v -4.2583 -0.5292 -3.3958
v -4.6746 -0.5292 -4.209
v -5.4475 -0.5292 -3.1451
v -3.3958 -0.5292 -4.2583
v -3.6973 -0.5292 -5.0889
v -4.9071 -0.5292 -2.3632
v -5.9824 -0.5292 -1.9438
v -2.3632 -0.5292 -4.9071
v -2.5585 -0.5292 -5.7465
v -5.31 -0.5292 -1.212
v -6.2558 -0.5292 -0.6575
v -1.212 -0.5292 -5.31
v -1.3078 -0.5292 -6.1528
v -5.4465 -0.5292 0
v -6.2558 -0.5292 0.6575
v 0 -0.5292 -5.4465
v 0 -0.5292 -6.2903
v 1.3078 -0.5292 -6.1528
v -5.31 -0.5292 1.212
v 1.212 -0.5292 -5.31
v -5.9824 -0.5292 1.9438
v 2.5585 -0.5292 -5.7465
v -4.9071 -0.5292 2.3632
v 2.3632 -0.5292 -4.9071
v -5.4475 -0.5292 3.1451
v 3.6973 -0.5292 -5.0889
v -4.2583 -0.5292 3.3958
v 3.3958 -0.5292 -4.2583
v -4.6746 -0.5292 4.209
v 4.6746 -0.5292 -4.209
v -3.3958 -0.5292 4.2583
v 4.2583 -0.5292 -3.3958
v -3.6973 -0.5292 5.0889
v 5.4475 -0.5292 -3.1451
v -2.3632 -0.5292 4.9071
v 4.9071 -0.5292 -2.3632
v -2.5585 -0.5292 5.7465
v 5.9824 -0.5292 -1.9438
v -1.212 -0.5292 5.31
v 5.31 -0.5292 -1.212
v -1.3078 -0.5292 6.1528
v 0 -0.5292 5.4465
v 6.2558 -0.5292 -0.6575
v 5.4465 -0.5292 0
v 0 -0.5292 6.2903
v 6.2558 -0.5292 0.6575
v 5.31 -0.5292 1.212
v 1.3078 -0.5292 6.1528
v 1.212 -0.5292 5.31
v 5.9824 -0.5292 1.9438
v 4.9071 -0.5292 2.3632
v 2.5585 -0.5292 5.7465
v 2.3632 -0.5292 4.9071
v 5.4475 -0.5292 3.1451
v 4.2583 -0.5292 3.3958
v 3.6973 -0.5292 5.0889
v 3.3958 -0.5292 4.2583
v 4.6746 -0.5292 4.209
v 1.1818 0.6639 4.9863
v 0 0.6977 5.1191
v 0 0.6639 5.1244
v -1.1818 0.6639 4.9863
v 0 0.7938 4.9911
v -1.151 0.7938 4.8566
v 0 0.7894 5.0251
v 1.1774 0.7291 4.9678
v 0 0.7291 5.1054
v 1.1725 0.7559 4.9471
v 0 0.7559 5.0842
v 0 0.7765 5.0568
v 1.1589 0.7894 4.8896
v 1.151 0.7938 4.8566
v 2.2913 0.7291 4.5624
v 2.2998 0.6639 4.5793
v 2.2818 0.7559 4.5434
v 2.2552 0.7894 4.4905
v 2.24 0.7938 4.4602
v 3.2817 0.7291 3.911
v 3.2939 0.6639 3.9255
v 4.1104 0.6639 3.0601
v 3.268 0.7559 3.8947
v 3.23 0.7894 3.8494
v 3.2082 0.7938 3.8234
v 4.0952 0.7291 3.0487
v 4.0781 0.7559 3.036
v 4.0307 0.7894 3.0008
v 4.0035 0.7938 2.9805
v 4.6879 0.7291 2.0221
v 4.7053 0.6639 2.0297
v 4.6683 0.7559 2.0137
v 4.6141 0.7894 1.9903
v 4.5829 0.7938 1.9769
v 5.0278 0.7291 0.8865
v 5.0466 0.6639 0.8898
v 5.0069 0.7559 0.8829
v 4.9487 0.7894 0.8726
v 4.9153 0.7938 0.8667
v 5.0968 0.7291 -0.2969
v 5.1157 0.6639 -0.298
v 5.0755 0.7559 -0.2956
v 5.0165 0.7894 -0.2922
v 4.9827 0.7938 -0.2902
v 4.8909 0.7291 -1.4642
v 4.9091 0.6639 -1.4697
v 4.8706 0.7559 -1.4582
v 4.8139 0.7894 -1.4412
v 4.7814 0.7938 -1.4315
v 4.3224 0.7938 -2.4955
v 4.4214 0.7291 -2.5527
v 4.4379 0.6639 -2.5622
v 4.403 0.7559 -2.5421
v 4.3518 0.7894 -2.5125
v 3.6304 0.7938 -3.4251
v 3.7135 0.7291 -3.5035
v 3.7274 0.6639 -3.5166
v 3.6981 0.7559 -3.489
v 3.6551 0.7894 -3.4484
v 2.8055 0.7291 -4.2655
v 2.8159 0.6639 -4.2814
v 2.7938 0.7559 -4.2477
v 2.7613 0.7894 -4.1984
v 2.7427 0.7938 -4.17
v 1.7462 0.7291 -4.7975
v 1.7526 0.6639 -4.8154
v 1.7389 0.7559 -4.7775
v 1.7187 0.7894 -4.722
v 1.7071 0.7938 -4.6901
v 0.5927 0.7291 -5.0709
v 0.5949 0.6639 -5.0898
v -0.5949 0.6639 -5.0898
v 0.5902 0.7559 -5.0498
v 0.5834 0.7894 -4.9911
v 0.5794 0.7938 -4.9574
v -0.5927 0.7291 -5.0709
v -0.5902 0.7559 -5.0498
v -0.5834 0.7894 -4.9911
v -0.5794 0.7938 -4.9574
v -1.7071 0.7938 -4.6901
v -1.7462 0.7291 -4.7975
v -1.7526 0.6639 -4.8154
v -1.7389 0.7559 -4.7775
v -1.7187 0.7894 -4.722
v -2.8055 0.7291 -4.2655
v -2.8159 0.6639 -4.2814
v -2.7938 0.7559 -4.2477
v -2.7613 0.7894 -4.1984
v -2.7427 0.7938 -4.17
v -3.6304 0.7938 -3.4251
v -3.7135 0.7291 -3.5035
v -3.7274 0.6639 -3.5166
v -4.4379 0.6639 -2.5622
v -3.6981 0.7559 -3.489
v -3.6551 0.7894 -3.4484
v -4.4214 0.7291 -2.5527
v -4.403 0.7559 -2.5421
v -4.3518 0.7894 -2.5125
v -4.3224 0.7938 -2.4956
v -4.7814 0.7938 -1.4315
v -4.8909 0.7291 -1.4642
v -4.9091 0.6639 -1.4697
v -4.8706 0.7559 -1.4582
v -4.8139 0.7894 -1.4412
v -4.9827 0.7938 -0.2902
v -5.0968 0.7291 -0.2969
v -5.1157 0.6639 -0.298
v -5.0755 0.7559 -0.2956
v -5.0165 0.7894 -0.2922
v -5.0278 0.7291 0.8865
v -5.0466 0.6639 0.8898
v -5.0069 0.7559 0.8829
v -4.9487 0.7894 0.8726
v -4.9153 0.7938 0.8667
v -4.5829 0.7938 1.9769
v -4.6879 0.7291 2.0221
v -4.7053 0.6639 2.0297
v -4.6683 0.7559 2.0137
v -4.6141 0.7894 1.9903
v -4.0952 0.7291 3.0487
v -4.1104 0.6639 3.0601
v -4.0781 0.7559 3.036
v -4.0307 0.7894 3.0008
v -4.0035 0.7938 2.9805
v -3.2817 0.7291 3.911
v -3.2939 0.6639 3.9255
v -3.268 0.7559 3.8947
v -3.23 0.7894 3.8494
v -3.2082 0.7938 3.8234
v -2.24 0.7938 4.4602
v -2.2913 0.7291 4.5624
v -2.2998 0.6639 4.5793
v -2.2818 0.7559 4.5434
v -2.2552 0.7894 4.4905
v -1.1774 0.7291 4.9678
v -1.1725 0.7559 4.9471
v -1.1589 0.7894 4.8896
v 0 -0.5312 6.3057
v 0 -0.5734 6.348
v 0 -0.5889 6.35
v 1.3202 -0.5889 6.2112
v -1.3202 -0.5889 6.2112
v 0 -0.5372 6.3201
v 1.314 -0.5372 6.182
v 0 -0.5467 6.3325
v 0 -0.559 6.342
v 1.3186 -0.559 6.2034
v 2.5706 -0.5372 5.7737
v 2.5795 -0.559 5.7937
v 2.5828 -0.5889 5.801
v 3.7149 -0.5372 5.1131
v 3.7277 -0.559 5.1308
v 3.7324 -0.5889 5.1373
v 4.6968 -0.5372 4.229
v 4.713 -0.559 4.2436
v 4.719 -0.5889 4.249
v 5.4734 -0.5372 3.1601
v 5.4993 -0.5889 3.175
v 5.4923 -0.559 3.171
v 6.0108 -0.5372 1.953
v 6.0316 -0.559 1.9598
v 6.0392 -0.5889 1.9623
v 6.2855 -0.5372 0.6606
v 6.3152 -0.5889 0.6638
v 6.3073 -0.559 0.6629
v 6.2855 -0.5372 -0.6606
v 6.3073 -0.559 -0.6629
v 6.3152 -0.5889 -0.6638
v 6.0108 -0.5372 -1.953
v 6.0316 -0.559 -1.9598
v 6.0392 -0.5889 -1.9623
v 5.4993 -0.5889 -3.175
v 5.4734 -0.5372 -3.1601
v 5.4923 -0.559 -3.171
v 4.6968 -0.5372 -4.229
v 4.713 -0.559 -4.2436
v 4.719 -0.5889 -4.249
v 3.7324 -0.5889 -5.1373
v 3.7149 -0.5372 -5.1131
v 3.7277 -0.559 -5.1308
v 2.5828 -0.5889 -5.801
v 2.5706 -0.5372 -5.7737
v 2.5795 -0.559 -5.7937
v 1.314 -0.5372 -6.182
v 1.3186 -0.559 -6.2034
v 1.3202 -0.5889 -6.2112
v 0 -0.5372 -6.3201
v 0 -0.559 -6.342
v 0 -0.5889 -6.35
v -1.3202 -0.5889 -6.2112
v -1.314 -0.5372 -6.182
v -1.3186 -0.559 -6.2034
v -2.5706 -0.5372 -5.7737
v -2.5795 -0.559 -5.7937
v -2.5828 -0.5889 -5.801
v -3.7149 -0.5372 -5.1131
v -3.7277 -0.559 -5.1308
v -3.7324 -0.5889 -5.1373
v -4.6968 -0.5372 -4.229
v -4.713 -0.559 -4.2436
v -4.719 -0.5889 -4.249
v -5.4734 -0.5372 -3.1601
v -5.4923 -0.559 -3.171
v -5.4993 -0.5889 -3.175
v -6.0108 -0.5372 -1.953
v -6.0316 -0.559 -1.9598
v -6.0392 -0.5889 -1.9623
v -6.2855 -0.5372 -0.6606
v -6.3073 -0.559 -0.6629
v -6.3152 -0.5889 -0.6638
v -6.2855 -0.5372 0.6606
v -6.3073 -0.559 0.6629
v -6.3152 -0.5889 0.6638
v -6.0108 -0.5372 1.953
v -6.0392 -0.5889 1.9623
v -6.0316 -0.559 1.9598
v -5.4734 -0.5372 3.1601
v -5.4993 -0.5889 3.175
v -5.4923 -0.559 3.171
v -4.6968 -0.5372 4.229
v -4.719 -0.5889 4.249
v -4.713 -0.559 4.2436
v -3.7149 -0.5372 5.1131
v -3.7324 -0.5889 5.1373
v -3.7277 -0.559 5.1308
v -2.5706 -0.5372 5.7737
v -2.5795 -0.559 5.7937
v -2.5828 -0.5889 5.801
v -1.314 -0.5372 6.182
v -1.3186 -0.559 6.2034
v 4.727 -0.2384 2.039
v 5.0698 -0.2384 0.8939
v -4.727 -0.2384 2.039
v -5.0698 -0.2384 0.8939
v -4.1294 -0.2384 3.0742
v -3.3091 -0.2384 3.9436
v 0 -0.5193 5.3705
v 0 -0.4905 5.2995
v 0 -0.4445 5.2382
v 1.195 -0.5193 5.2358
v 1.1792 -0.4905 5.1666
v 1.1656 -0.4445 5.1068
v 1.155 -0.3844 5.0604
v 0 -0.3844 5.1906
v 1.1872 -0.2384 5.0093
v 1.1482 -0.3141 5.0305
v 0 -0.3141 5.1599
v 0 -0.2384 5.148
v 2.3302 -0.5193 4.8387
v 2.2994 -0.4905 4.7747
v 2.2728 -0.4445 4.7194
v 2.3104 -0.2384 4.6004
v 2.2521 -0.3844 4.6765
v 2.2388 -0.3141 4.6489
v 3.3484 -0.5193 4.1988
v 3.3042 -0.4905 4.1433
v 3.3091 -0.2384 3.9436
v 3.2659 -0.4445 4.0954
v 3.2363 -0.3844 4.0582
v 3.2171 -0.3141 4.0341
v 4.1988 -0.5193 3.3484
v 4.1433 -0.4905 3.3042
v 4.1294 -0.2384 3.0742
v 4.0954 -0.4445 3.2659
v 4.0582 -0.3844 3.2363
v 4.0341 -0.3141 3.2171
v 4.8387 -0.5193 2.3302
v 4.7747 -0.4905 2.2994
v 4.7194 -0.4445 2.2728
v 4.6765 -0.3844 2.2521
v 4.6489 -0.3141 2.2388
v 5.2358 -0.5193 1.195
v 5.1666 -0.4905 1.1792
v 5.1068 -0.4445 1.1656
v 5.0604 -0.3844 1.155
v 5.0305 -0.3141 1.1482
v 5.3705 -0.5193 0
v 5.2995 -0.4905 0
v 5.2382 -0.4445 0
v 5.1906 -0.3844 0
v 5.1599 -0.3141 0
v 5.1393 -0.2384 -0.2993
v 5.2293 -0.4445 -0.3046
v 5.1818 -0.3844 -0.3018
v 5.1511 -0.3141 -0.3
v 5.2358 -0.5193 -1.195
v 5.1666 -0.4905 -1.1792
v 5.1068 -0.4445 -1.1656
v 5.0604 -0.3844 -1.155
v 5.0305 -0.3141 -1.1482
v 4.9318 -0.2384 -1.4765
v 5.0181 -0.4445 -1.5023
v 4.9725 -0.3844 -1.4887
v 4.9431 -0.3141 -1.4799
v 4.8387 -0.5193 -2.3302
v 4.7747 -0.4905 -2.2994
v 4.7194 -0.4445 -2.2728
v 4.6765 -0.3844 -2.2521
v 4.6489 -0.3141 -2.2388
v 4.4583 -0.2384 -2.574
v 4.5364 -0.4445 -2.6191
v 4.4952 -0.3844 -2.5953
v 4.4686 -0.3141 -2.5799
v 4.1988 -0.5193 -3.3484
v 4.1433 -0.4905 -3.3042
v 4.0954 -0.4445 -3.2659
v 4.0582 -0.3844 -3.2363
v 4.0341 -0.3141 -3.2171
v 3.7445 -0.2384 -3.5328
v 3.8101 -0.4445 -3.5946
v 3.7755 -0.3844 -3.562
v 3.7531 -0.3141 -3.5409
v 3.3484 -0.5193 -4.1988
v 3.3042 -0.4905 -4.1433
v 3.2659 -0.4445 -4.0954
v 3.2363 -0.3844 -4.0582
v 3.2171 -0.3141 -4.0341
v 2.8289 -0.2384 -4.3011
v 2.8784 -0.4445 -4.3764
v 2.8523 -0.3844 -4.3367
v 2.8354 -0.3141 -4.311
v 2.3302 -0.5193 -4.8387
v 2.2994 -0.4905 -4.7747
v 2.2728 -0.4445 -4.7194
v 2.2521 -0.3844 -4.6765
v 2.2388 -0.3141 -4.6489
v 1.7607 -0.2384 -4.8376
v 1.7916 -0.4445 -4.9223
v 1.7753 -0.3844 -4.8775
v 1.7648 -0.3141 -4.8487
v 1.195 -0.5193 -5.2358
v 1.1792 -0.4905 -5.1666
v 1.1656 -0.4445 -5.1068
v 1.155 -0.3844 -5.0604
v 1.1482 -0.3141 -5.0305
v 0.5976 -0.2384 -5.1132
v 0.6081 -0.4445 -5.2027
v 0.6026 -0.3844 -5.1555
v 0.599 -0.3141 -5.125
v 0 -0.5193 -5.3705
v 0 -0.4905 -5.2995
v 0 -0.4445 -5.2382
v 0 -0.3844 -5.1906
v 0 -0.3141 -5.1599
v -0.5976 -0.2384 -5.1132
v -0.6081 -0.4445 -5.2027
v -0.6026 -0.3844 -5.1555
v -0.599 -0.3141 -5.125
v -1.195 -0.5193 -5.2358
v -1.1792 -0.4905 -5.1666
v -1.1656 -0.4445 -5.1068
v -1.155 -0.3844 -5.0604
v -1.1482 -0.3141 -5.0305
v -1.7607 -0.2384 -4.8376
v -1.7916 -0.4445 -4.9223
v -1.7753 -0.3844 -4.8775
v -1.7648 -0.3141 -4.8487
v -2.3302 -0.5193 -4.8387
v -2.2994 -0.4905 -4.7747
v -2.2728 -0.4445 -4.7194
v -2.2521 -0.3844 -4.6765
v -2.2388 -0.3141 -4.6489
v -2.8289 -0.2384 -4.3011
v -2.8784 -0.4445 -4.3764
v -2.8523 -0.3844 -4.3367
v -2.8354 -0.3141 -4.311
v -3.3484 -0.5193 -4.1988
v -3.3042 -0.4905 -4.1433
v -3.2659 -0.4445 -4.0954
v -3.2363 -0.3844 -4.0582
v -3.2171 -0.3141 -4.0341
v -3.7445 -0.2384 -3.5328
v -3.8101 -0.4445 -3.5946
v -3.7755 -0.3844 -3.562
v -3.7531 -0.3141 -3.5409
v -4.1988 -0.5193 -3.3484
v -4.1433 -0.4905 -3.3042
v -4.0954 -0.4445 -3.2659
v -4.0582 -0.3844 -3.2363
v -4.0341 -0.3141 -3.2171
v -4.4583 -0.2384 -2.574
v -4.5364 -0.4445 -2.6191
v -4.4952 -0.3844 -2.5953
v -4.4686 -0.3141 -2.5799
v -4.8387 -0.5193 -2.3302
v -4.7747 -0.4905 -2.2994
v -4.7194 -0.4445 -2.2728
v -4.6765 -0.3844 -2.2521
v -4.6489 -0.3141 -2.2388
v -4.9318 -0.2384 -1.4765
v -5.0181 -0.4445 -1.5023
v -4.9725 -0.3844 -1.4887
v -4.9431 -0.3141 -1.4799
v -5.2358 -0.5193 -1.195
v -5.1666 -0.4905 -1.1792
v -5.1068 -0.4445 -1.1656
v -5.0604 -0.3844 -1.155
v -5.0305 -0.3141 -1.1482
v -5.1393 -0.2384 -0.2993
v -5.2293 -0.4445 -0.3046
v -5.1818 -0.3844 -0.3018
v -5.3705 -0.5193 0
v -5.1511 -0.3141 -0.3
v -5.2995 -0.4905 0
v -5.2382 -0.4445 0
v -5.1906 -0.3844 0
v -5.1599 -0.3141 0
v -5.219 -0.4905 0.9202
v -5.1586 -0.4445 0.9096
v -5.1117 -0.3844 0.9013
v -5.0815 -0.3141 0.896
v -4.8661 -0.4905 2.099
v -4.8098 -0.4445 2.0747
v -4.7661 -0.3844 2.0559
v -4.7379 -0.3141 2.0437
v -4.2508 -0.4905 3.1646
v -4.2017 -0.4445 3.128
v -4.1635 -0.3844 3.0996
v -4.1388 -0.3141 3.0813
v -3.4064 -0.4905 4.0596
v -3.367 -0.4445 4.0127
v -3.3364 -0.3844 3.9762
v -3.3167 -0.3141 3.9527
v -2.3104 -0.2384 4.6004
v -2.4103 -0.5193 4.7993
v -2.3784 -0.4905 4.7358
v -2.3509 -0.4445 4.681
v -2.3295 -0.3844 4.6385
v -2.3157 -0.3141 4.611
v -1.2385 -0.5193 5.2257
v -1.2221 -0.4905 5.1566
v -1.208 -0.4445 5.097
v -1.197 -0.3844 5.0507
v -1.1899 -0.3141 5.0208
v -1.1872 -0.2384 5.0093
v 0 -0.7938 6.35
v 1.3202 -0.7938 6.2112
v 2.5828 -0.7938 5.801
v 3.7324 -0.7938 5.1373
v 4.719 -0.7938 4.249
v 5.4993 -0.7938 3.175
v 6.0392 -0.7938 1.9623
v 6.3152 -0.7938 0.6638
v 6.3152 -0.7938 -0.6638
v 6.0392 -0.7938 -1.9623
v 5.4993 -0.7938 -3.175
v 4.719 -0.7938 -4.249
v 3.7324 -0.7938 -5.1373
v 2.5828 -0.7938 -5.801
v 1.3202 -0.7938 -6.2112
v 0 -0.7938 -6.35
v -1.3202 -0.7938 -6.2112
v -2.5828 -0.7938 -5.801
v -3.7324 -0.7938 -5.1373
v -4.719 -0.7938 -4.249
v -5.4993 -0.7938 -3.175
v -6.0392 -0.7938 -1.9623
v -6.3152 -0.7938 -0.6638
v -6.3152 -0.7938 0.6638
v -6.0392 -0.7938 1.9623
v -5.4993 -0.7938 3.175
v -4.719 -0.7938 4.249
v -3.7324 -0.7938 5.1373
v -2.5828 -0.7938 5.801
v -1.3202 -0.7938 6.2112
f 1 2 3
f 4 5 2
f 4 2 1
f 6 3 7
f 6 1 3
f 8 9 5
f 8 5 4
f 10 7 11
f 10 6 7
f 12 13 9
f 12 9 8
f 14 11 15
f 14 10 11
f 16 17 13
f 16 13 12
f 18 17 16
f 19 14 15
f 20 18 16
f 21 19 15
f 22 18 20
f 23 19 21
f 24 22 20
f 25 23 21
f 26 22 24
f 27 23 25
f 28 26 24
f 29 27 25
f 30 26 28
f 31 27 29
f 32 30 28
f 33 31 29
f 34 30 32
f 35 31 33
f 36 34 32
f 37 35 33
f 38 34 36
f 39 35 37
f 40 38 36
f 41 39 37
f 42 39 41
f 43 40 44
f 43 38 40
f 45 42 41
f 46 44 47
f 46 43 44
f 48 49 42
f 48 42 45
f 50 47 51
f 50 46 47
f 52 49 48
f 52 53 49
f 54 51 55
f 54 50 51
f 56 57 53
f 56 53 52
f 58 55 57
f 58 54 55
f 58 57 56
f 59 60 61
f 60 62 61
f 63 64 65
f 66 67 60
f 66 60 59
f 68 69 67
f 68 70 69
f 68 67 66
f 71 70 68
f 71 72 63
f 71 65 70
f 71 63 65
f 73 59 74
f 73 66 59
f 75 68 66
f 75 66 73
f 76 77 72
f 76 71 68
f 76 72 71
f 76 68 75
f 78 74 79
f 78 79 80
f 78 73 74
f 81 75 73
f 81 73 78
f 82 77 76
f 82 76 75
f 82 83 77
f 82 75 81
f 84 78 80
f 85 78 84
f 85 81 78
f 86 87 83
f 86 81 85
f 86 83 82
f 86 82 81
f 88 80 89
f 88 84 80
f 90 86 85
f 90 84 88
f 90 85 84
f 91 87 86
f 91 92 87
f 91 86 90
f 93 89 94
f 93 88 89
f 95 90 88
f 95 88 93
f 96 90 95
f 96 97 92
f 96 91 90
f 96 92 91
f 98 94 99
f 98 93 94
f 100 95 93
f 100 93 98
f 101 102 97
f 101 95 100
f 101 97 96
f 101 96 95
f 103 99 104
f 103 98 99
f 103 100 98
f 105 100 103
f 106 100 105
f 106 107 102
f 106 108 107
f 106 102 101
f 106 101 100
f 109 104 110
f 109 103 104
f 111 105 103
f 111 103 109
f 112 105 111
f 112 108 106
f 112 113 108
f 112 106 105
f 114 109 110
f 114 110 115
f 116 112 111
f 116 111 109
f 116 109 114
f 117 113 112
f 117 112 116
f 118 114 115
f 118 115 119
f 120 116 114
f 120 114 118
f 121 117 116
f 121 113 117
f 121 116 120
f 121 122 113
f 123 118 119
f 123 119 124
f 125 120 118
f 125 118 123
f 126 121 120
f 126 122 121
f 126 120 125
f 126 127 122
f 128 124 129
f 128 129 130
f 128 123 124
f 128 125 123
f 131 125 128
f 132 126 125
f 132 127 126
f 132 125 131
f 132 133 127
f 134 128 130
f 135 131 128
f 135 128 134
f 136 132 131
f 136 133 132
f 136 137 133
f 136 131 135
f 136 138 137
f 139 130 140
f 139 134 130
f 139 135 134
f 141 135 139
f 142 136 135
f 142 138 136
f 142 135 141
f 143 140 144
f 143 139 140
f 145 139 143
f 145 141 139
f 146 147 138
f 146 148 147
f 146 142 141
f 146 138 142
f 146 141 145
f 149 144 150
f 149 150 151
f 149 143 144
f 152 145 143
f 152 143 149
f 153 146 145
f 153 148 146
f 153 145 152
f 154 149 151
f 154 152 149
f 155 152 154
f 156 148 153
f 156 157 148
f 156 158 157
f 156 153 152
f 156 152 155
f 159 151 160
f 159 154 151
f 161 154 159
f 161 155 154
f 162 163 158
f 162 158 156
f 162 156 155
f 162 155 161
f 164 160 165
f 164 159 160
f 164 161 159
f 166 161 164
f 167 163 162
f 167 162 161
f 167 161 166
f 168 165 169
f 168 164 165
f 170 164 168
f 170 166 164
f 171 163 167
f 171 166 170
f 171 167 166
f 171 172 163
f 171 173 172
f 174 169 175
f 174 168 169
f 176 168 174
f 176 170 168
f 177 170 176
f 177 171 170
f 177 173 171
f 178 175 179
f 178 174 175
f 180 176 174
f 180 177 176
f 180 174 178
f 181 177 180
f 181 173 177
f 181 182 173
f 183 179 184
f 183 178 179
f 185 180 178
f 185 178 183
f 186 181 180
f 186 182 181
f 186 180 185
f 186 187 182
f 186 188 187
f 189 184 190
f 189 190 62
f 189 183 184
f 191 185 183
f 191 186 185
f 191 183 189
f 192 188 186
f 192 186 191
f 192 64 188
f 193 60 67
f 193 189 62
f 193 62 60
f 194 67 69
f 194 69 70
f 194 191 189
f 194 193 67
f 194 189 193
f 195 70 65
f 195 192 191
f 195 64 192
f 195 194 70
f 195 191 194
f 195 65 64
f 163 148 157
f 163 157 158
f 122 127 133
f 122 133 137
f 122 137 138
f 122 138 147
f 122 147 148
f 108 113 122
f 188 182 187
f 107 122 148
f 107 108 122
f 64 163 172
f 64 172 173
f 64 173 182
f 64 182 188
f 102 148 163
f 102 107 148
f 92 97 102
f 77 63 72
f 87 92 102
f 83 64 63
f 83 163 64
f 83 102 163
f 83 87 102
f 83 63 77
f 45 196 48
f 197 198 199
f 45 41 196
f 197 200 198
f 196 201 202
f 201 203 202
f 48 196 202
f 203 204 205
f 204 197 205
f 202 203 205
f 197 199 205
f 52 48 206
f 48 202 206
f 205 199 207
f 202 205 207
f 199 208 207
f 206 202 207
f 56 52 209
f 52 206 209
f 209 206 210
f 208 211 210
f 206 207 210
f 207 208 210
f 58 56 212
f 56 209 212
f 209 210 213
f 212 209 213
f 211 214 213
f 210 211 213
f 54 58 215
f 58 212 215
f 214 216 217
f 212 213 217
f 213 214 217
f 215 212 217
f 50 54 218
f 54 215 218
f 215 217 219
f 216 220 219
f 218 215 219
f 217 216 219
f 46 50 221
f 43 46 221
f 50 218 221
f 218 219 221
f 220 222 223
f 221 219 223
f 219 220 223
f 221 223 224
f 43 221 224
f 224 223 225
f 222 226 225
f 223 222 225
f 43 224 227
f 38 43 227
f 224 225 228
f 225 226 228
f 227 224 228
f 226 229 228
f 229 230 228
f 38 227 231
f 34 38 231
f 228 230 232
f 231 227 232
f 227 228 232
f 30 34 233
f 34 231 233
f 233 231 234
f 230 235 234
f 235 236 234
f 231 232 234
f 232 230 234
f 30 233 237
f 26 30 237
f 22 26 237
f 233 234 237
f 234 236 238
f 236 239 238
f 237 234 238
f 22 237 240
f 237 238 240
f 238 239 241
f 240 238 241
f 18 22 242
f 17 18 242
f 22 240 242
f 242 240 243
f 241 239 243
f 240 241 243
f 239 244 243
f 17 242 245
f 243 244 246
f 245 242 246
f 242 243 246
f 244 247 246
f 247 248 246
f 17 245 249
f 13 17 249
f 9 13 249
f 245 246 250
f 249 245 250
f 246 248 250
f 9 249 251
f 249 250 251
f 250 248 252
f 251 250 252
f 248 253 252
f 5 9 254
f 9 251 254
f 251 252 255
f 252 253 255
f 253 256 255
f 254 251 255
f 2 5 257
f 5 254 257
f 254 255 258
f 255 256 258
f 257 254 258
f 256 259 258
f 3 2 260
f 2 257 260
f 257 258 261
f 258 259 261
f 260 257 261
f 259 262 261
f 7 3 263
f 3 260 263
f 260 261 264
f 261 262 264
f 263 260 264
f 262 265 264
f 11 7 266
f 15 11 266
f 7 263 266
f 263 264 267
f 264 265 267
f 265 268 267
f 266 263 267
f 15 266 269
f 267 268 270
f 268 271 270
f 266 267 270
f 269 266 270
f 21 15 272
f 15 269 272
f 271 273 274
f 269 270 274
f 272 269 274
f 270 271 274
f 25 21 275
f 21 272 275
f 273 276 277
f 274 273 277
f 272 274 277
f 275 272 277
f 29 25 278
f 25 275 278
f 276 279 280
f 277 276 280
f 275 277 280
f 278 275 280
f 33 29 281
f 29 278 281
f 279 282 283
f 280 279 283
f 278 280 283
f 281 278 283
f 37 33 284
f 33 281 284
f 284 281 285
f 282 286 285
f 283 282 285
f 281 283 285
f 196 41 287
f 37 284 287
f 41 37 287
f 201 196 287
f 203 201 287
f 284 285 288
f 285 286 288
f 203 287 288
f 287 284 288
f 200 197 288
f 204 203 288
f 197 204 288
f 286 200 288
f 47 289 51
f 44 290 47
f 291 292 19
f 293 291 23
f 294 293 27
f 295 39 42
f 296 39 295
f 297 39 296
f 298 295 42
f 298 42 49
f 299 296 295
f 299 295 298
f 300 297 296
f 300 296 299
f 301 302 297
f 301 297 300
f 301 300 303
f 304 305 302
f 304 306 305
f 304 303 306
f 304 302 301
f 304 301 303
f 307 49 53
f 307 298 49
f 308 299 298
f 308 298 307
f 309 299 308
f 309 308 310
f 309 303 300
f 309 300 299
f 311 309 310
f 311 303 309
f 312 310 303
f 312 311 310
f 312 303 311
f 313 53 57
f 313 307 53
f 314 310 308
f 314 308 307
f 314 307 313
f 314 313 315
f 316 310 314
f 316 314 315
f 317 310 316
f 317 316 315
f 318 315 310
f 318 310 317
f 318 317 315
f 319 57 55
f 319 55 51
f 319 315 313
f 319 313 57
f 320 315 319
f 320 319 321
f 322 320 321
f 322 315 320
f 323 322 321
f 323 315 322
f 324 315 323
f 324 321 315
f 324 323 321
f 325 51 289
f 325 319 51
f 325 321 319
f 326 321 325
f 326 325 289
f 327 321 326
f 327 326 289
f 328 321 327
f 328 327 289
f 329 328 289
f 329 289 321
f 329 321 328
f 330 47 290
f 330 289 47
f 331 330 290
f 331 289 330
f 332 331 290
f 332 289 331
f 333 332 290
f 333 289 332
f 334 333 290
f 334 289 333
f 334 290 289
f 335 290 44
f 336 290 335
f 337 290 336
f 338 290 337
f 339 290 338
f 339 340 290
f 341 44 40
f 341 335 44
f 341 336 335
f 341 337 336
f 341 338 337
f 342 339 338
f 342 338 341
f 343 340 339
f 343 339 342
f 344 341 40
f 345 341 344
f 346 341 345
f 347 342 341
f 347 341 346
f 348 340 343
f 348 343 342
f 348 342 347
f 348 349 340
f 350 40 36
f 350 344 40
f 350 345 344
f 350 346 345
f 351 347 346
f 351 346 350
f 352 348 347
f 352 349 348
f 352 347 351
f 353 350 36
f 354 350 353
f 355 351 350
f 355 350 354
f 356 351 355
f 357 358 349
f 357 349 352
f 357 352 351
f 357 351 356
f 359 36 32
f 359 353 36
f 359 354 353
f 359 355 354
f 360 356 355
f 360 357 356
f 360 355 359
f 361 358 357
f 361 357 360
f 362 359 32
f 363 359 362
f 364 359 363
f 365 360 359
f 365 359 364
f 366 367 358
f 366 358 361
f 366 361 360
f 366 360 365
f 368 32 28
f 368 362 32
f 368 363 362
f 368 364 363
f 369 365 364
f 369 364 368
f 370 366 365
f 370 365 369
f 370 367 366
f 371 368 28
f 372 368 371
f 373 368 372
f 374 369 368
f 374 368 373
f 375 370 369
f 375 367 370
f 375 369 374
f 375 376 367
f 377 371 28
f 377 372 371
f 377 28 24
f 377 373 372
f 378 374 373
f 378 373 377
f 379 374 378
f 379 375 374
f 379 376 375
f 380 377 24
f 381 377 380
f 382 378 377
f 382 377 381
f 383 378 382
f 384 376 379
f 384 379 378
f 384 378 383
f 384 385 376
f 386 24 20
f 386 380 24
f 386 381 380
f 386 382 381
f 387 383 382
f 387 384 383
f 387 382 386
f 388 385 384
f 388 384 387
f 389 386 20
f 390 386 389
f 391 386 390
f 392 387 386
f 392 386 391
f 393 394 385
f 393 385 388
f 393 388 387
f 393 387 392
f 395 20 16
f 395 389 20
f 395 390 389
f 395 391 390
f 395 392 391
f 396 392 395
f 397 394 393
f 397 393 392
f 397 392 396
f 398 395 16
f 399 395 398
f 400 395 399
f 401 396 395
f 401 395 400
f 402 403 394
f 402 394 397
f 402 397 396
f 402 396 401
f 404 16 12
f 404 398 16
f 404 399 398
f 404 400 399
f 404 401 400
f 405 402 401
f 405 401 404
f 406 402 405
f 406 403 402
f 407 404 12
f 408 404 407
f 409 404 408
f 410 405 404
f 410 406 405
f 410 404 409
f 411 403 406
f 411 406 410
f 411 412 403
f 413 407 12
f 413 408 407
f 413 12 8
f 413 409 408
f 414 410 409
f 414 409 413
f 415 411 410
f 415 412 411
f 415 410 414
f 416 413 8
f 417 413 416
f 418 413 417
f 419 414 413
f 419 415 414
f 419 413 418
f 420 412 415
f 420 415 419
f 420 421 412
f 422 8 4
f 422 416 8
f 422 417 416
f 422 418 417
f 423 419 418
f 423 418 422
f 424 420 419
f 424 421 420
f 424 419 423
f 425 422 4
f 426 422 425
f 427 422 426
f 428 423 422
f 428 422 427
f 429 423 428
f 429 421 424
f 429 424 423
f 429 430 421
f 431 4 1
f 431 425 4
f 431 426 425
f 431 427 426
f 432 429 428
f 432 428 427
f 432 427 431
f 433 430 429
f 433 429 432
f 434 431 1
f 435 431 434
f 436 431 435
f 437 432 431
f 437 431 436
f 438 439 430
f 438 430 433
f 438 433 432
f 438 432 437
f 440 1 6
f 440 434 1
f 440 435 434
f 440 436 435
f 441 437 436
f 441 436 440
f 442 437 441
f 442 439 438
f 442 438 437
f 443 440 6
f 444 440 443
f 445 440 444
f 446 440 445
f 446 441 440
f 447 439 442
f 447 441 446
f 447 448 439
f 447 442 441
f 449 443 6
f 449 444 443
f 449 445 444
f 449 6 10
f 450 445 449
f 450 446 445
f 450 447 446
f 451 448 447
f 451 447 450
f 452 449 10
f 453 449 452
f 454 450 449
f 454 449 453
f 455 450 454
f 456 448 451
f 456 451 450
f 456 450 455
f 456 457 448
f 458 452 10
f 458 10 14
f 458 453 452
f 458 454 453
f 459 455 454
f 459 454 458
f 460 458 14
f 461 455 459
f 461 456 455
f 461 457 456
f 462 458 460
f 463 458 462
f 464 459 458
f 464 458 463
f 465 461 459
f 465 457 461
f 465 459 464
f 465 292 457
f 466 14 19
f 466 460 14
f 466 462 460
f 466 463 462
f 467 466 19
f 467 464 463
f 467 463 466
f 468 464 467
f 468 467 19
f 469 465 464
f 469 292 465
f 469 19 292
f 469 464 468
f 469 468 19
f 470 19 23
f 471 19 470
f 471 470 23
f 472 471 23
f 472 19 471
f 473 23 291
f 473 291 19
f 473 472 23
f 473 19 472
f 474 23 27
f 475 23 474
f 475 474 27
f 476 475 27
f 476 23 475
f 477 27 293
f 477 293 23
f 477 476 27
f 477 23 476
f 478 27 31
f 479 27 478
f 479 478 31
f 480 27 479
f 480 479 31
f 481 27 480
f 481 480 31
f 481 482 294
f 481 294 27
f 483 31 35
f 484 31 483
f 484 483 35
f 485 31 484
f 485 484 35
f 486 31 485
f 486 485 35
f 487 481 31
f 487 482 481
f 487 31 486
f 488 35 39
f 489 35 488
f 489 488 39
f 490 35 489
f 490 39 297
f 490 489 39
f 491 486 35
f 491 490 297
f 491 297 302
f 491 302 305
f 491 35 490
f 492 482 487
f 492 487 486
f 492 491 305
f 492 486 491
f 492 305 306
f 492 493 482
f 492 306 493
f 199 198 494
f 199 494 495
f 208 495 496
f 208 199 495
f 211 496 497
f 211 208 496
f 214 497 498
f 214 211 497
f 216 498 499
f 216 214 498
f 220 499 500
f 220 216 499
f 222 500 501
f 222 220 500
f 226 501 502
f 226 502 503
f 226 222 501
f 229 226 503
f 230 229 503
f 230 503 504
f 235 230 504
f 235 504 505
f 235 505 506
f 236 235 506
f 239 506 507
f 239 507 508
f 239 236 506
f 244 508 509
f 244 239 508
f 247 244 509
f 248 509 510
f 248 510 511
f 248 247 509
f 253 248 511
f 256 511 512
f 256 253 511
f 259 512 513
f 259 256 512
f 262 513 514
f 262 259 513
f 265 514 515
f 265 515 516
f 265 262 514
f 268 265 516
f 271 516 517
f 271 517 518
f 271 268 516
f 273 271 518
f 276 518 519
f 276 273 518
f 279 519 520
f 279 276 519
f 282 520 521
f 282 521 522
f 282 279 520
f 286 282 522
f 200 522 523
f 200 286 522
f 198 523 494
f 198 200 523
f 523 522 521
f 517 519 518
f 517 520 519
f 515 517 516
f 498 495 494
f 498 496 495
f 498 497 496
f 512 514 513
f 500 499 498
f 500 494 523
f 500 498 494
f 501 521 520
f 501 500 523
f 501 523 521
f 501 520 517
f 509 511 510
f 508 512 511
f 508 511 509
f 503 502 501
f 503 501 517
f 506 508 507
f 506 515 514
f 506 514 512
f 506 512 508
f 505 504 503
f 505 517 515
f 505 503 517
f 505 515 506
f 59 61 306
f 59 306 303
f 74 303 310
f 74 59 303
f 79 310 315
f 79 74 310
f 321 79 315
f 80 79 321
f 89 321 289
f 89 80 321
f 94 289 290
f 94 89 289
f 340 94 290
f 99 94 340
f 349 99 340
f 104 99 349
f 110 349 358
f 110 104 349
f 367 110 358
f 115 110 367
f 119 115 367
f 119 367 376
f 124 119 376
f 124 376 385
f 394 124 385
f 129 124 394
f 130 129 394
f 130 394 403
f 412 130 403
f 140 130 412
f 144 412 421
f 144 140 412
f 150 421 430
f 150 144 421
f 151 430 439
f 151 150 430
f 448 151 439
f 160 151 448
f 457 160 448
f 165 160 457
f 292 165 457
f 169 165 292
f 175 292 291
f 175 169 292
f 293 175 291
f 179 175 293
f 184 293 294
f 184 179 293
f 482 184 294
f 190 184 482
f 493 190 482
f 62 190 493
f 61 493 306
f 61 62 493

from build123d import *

# Parameters (mm, degrees)
FILLET1_R = 0.298588597
FILLET2_R = 0.059717719


with BuildPart() as part:
    # Sketch2 → Revolve1 (revolve)
    with BuildSketch(Plane(origin=(0, 0, 0), x_dir=(0, 0, -1), z_dir=(1, 0, 0))):
        with BuildLine():
            Line((-6.35, -0.79375), (-6.35, -0.529166667))
            Line((-6.35, -0.529166667), (-5.155645611, -0.529166667))
            Line((-5.155645611, -0.529166667), (-5.124404304, 0.663890696))
            ThreePointArc((-5.124404304, 0.663890696), (-5.084150358, 0.755918864), (-4.9911, 0.79375))
            Line((-4.9911, 0.79375), (0, 0.79375))
            Line((0, 0.79375), (0, -0.79375))
            Line((0, -0.79375), (-6.35, -0.79375))
        make_face()
    revolve(axis=Axis((0, -0.79375, 0), (0, 1, 0)))

    # Fillet1
    fillet1_edges = [part.edges().sort_by_distance(p)[0] for p in [
        (0, -0.529166667, -5.155645611),
    ]]
    fillet(fillet1_edges, radius=FILLET1_R)

    # Fillet2
    fillet2_edges = [part.edges().sort_by_distance(p)[0] for p in [
        (0, -0.529166667, -6.35),
    ]]
    fillet(fillet2_edges, radius=FILLET2_R)


solid = part.part
